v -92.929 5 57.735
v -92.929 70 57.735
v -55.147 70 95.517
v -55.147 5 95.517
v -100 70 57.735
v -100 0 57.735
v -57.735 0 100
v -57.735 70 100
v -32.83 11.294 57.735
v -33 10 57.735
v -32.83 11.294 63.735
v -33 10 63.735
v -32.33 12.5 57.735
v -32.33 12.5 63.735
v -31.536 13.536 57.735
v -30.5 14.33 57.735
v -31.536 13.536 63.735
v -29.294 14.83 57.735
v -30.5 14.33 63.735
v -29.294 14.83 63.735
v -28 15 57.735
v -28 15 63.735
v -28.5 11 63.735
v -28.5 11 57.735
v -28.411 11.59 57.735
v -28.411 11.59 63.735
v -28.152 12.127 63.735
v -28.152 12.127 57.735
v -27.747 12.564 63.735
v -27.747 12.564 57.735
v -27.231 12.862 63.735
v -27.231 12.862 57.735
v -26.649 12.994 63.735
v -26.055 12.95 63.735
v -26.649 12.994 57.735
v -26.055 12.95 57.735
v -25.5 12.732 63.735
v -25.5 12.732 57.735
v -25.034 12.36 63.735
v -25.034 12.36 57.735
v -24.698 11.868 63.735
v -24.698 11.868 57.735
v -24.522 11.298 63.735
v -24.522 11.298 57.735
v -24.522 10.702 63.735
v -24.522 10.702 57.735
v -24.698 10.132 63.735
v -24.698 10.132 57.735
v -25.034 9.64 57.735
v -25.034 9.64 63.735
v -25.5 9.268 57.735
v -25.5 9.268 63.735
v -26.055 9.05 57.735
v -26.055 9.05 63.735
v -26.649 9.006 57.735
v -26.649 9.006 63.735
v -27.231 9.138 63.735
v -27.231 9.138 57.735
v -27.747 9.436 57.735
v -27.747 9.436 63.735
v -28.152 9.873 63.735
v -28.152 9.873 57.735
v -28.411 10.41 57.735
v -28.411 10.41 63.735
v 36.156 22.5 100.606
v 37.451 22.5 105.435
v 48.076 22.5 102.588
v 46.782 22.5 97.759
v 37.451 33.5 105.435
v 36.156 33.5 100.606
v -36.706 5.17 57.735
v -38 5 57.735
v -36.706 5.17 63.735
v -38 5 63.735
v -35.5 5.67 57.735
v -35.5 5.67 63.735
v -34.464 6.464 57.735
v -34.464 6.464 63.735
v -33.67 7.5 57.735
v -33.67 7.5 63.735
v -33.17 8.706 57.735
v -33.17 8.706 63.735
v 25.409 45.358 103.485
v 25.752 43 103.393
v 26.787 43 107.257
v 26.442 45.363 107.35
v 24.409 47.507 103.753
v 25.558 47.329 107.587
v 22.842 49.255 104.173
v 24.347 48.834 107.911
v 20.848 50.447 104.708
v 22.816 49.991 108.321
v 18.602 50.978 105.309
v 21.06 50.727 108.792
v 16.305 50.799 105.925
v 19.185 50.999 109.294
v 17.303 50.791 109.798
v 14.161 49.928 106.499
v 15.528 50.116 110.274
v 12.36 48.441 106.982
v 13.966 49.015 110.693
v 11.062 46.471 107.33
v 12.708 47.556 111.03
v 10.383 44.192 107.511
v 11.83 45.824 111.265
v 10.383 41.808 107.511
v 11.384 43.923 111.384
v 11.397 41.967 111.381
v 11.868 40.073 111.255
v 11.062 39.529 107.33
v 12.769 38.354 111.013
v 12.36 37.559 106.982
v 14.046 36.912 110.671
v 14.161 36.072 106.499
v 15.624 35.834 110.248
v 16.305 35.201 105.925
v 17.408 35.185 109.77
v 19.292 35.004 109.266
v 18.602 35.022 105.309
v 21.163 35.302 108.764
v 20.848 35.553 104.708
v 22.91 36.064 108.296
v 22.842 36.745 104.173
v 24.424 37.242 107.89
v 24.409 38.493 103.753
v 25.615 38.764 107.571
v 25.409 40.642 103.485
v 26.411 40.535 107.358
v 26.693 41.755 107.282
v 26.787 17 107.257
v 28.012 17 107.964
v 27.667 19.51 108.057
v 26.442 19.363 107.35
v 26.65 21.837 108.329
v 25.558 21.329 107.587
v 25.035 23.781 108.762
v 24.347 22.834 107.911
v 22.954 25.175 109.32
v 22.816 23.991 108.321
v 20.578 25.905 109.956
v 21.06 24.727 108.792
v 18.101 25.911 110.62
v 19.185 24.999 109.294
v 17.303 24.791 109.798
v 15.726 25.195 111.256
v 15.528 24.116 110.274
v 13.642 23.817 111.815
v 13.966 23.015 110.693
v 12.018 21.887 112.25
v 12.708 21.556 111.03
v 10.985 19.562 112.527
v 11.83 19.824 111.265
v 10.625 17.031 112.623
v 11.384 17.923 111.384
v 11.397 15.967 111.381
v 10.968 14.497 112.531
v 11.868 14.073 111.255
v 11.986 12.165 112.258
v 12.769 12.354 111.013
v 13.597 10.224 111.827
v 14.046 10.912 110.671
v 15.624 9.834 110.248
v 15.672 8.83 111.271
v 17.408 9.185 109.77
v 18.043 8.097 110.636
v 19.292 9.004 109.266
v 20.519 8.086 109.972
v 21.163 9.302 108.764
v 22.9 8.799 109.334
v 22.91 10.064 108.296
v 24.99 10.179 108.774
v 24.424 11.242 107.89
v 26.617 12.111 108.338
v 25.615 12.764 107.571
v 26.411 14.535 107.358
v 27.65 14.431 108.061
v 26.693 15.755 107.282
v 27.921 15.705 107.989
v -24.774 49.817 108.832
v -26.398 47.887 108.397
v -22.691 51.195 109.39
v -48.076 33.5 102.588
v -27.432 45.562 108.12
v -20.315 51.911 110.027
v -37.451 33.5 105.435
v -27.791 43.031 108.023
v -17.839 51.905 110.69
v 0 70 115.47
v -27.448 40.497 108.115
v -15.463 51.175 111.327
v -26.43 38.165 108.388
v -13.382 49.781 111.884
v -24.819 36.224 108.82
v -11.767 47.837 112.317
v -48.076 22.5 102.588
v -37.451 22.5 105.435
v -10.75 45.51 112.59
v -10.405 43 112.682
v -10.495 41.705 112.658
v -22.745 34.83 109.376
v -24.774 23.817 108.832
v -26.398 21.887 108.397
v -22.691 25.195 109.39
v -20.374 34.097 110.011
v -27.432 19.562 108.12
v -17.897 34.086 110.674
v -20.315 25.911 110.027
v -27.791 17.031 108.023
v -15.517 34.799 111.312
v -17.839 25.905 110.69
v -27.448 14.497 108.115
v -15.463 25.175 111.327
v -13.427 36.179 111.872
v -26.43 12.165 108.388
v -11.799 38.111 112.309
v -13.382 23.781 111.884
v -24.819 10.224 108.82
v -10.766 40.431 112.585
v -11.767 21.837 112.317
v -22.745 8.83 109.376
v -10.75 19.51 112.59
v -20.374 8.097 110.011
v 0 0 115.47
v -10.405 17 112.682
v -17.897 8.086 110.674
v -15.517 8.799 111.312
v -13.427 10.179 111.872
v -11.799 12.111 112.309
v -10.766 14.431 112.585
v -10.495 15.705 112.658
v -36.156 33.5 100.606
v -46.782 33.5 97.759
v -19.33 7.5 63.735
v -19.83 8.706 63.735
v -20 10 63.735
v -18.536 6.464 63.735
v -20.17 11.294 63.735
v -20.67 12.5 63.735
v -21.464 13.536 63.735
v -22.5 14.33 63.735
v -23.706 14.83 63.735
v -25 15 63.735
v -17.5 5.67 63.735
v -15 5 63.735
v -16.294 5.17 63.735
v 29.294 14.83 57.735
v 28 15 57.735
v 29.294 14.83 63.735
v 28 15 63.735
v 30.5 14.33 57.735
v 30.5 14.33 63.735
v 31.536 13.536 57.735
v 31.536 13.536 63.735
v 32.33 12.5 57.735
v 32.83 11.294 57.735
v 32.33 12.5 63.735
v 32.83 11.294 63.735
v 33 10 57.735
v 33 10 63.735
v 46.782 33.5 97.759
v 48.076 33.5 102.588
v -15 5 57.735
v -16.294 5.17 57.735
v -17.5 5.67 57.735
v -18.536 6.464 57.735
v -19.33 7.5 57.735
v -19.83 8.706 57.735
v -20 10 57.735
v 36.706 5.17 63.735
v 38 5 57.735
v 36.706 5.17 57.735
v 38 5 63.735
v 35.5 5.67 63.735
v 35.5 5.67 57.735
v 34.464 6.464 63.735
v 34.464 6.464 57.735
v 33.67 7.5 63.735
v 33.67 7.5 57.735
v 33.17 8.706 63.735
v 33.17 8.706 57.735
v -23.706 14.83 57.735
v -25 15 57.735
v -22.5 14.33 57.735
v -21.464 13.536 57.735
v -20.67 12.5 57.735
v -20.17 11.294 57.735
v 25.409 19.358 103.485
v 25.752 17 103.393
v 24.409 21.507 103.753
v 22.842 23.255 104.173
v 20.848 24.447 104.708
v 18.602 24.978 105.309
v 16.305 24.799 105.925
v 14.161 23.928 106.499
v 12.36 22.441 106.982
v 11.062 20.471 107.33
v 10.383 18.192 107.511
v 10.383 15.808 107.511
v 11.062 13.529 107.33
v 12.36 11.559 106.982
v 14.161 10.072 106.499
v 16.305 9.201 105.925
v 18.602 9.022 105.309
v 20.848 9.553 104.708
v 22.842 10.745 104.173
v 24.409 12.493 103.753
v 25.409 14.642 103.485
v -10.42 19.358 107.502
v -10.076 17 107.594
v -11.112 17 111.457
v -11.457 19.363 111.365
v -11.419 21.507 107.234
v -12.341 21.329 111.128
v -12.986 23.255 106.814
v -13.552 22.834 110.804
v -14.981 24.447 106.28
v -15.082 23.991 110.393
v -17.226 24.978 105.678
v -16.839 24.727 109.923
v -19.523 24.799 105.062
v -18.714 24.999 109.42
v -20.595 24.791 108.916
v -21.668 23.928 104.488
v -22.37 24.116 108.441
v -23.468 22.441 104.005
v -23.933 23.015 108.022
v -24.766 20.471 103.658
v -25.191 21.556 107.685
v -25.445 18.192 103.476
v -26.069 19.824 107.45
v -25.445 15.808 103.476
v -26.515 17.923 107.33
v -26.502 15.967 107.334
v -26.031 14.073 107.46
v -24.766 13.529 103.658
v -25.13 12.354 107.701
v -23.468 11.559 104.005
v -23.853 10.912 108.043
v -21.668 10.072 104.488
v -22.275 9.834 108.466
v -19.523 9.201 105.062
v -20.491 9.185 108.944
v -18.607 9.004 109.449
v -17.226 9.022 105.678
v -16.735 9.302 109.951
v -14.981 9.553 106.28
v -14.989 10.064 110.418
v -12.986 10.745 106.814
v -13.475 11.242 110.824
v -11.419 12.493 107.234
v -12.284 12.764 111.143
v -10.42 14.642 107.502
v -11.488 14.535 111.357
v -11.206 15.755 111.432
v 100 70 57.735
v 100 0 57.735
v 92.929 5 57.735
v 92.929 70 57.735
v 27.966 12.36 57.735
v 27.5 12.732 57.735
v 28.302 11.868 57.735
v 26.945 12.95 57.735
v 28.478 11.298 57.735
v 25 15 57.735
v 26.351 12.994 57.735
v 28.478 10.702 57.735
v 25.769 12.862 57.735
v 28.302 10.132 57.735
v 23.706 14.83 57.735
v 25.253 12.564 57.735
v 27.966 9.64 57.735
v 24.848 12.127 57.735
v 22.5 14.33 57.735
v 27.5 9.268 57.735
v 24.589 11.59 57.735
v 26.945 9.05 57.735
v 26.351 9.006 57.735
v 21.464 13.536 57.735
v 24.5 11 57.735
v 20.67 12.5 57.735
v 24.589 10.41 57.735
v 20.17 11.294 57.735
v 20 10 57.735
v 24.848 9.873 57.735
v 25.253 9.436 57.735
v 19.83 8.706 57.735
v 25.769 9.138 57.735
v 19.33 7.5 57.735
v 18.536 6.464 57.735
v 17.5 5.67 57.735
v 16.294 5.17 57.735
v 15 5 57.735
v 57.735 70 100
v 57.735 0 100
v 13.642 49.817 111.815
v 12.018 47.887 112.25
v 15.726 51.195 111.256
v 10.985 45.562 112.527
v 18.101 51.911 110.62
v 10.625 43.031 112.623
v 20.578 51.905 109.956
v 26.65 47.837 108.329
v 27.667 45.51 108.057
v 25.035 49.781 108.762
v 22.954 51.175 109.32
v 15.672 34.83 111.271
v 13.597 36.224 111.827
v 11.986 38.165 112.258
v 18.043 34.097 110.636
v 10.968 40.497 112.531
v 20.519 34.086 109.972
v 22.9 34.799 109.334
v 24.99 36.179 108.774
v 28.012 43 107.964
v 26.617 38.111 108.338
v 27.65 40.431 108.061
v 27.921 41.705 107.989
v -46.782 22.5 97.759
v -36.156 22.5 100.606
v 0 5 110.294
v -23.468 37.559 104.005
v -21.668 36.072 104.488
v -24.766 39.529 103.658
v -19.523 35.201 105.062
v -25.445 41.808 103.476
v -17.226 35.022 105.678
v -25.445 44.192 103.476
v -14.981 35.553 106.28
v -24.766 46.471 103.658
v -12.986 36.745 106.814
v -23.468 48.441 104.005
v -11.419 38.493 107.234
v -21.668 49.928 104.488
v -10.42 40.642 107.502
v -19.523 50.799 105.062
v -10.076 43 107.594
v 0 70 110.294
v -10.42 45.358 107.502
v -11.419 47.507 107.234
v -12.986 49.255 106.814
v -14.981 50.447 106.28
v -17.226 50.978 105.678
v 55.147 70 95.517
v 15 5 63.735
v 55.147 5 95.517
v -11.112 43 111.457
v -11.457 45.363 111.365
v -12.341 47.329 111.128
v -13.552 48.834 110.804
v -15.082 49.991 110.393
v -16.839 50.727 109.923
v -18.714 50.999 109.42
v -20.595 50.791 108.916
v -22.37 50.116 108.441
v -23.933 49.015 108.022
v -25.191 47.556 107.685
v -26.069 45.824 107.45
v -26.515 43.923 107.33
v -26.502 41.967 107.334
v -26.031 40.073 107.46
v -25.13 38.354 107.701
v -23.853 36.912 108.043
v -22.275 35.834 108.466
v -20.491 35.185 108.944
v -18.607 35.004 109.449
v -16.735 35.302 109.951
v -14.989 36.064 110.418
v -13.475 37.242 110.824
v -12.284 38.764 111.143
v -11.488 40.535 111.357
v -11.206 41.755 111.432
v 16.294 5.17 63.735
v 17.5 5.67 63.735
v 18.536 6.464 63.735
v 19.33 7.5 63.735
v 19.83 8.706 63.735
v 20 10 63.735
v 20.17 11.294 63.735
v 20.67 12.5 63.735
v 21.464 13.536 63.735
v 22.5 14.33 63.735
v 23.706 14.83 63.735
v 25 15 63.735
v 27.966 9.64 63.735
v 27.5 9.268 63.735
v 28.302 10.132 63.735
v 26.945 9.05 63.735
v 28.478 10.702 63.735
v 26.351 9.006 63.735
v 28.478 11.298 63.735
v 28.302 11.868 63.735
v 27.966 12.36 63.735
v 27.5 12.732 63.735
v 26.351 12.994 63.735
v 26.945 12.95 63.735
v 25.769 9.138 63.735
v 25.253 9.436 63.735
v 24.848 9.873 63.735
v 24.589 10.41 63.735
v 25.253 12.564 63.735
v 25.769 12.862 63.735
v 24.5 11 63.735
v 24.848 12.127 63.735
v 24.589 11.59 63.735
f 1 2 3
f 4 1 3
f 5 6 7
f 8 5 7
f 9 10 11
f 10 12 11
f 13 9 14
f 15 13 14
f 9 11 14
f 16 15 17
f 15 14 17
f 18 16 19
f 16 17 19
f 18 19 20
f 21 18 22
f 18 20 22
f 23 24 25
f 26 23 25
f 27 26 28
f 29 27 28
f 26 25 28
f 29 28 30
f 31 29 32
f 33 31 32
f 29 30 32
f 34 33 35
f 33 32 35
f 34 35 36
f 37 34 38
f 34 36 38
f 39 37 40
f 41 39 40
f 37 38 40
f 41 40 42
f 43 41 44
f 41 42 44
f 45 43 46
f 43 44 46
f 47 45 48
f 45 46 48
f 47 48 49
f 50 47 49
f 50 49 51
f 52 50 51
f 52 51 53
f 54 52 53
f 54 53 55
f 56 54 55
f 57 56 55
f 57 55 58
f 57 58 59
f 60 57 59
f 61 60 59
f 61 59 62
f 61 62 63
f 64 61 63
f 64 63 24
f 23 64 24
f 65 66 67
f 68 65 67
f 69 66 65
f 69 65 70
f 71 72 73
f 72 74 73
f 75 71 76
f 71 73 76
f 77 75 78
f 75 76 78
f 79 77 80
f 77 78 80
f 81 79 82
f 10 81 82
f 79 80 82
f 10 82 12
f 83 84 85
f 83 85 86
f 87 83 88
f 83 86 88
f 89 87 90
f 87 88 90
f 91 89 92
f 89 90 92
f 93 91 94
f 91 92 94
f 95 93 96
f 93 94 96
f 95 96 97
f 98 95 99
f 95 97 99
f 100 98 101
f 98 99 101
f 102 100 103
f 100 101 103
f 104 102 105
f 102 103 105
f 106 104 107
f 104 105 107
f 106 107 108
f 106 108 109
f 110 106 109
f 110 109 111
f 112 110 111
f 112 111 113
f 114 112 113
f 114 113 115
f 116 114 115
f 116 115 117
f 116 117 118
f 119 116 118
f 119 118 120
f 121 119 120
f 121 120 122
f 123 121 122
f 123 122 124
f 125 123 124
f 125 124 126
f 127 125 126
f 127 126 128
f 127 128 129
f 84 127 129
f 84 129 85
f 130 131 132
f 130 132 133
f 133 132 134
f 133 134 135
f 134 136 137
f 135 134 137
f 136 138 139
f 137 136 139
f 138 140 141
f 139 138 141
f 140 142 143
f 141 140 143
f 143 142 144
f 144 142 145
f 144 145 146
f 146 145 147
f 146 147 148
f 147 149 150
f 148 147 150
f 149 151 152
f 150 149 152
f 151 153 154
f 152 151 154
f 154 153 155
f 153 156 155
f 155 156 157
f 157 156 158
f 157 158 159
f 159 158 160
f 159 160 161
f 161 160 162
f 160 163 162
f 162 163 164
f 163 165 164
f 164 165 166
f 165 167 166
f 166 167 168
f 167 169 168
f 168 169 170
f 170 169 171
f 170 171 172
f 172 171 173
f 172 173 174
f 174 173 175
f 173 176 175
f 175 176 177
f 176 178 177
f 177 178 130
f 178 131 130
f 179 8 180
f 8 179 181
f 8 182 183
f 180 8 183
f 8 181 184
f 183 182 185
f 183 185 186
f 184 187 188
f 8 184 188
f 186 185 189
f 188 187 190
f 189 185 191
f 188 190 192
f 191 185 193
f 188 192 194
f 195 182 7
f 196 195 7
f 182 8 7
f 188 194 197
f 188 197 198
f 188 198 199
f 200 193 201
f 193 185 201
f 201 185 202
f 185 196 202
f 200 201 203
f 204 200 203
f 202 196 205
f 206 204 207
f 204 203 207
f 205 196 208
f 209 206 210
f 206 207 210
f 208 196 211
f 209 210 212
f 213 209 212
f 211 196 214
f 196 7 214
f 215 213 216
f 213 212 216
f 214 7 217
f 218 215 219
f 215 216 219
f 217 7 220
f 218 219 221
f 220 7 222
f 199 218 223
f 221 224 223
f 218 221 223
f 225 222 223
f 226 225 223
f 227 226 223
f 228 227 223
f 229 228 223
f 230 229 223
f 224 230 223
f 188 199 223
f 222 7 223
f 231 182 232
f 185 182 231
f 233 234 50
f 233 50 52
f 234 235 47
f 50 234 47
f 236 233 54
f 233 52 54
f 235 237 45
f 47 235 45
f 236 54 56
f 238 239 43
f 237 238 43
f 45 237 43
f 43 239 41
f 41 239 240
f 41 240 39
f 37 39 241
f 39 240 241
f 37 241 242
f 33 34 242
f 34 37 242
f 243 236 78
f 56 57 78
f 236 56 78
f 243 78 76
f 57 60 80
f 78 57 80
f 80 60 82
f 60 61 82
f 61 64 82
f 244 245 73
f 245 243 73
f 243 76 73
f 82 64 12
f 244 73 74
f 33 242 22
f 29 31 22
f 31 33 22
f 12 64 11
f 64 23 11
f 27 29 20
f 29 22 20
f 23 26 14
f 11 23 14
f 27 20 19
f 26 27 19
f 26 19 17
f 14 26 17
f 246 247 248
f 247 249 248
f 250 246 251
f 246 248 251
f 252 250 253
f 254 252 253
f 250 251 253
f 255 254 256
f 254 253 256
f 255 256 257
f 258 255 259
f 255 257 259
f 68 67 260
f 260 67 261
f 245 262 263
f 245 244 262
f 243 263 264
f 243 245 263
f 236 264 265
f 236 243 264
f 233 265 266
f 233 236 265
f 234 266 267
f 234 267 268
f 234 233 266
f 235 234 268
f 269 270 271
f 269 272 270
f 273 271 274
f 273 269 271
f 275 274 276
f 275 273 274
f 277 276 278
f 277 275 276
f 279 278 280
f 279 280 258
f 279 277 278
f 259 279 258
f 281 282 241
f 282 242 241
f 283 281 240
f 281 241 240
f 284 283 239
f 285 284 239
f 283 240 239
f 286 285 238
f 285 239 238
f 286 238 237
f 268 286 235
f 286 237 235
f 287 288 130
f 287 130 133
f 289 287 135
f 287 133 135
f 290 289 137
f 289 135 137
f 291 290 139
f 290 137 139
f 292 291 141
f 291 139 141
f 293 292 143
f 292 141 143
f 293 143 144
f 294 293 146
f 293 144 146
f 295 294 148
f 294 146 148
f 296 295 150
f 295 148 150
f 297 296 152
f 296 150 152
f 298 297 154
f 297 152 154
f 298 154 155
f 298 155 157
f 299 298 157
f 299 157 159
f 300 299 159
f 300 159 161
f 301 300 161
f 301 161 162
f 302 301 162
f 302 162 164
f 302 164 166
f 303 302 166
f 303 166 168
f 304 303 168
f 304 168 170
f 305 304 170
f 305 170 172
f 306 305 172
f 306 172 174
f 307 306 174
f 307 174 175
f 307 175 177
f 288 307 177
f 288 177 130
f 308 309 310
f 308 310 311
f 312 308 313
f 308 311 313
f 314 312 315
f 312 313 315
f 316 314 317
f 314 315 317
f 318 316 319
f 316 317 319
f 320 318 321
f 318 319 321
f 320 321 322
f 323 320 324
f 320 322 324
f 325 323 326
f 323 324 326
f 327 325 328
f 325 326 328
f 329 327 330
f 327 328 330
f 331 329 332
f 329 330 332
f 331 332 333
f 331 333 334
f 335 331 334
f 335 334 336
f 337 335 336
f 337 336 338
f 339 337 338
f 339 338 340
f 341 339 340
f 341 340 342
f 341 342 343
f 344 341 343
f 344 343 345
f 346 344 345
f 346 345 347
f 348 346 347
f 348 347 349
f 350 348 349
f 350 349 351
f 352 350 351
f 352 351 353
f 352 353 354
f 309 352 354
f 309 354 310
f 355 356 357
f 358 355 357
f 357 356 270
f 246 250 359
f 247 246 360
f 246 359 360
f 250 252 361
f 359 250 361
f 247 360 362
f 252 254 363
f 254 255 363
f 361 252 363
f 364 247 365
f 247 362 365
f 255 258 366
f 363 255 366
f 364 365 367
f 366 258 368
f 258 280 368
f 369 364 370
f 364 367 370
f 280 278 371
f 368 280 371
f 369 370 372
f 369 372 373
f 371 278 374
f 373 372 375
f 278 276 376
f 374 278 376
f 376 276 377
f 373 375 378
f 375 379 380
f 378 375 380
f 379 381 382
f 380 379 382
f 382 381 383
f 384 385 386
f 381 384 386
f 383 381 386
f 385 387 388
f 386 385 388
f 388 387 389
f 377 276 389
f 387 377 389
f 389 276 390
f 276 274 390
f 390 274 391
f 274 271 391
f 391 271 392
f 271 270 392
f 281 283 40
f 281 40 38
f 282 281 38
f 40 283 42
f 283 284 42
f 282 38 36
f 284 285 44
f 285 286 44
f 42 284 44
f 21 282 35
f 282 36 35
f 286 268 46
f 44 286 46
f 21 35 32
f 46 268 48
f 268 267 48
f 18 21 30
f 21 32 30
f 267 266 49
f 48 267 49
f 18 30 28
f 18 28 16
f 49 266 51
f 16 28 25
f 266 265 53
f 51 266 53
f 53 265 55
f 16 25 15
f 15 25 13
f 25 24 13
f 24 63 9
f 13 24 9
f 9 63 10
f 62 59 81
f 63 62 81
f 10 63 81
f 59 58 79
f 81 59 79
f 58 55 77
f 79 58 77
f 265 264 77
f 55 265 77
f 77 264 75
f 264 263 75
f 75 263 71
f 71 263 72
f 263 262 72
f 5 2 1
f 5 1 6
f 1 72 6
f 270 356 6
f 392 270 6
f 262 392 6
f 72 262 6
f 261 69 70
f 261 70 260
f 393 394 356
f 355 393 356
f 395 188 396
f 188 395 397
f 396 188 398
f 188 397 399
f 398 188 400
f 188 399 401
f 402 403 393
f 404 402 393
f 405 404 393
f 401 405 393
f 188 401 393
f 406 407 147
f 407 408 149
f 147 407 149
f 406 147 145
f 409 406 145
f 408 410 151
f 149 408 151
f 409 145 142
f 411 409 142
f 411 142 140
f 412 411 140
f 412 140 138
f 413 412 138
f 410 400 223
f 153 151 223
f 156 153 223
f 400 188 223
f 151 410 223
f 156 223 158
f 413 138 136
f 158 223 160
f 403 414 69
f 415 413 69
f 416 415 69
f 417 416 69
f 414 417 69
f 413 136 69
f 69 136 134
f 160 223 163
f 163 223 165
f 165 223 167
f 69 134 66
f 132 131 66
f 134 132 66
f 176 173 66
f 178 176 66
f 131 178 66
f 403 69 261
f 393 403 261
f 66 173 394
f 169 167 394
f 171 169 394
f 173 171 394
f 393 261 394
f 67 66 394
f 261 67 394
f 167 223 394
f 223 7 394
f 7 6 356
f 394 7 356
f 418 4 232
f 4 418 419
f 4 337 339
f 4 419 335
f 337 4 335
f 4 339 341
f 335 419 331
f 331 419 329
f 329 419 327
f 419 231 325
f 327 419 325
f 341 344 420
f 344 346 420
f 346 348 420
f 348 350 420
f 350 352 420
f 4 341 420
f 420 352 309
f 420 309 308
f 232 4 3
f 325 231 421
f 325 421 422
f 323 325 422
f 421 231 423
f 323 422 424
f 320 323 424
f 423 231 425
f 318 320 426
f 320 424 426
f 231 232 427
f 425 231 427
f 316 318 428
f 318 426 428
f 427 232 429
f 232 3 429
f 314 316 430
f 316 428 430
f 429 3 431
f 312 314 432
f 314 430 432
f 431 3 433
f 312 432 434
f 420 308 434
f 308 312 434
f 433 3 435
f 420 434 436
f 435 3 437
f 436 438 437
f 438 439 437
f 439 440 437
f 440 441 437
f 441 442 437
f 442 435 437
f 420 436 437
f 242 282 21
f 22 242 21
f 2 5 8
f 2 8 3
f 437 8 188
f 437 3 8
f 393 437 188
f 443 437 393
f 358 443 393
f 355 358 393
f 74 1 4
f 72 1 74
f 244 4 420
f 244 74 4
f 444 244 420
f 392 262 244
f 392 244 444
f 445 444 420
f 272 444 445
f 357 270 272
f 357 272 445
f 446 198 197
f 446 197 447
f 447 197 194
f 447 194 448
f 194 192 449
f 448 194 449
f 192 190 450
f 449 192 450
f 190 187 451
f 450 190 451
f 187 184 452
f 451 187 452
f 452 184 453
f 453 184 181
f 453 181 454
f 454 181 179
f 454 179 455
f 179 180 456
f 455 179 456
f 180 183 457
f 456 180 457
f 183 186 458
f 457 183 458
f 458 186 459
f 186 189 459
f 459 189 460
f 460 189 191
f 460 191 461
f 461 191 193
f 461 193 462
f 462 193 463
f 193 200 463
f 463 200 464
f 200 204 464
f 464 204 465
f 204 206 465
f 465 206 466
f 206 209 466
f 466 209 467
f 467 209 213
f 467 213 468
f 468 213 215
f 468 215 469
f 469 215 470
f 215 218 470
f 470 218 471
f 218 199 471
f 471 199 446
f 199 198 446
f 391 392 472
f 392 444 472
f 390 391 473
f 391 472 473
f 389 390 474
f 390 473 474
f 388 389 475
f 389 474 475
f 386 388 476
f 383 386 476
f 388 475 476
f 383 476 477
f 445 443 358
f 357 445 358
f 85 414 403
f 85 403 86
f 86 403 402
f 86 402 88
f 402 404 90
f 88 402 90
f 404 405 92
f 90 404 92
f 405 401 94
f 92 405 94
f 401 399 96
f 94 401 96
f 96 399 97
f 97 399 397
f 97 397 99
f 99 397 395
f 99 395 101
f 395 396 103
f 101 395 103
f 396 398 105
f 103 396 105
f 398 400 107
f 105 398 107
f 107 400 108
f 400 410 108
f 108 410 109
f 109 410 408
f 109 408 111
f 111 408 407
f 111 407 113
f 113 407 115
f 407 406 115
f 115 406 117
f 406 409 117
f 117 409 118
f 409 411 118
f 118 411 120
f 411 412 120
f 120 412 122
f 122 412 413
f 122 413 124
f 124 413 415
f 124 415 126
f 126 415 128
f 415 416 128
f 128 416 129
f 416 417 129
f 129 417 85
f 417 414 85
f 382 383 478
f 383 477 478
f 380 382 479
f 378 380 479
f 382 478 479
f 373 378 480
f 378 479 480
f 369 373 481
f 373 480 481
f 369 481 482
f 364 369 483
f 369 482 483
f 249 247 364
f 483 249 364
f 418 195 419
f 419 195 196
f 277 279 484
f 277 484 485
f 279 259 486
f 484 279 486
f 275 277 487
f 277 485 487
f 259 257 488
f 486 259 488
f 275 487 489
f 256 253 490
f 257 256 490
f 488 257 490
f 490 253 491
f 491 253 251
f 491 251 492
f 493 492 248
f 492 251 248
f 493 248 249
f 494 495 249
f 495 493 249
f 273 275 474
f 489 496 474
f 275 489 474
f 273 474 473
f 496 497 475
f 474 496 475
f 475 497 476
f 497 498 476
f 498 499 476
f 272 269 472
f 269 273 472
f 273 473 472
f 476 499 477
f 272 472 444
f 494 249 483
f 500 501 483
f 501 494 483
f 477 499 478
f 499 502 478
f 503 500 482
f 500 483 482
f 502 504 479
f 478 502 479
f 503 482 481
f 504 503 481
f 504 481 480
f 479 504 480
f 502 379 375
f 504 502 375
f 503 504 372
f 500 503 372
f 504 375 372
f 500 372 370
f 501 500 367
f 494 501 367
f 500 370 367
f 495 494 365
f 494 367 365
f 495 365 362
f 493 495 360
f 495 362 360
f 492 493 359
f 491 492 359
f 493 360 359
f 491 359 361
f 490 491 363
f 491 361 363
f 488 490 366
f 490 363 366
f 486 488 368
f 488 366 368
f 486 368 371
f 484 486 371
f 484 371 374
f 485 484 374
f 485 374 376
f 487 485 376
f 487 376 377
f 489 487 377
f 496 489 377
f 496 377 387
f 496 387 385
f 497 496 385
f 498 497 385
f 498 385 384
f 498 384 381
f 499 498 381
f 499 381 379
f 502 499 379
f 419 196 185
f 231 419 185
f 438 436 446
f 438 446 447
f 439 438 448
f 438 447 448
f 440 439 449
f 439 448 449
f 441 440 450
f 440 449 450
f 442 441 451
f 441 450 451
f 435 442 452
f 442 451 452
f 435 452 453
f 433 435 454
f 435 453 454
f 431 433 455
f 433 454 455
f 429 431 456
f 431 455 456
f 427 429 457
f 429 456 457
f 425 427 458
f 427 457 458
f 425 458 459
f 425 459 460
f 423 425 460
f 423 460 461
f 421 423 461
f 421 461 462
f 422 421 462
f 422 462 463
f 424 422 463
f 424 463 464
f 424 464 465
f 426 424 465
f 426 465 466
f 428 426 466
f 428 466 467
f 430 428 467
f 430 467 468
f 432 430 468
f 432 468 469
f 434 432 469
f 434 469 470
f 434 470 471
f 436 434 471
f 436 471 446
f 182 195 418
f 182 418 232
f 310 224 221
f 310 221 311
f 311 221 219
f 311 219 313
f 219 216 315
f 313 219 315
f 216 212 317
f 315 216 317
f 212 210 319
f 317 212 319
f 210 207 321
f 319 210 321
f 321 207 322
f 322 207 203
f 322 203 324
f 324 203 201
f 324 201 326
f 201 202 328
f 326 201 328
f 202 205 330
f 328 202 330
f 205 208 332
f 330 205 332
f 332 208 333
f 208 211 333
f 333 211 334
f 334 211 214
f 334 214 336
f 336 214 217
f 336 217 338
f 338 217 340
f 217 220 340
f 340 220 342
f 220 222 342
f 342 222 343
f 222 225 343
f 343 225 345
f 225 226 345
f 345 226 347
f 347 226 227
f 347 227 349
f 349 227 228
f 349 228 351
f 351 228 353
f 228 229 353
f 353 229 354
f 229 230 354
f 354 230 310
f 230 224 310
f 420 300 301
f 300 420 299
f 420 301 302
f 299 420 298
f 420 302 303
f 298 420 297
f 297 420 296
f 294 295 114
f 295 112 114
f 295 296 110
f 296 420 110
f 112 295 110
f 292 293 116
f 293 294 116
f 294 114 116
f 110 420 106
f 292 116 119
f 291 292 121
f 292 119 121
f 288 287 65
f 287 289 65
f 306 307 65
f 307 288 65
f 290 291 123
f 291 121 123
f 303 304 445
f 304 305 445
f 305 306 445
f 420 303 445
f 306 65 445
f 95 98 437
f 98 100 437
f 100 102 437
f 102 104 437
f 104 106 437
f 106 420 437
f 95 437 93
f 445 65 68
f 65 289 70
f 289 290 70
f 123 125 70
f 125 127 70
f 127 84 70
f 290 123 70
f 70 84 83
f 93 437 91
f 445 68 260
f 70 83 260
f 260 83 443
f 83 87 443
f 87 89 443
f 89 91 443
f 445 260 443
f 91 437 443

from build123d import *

# Parameters (mm, degrees)
BOSS_EXTRUDE1_DEPTH = 70
CUT_EXTRUDE1_DEPTH  = 65
SKETCH5_R           = 8
CUT_EXTRUDE2_DEPTH  = 10
SKETCH6_R           = 8
CUT_EXTRUDE3_DEPTH  = 10
CHAMFER2_SIZE       = 1
SKETCH7_W           = 11
SKETCH7_H           = 11
CUT_EXTRUDE4_DEPTH  = 10
SKETCH8_W           = 11
SKETCH8_H           = 11
CUT_EXTRUDE5_DEPTH  = 10
SKETCH9_W           = 13
SKETCH9_H           = 10
BOSS_EXTRUDE2_DEPTH = 6
SKETCH10_R          = 2
CUT_EXTRUDE6_DEPTH  = 10
FILLET1_R           = 5


with BuildPart() as part:
    # Sketch1 → Boss-Extrude1 (new body)
    with BuildSketch(Plane(origin=(0, 0, 0), x_dir=(1, 0, 0), z_dir=(0, 1, 0))):
        Polygon((57.735026919, -100), (100, -57.735026919), (-100, -57.735026919), (-57.735026919, -100), (0, -115.470053838), align=None)
    extrude(amount=BOSS_EXTRUDE1_DEPTH)

    # Sketch4 → Cut-Extrude1 (cut)
    with BuildSketch(Plane(origin=(0, 70, 0), x_dir=(1, 0, 0), z_dir=(0, 1, 0))):
        Polygon((110.293672936, 0), (95.517122639, 55.146836468), (55.146836468, 95.517122639), (0, 110.293672936), (-55.146836468, 95.517122639), (-95.517122639, 55.146836468), (-110.293672936, 0), (-95.517122639, -55.146836468), (-55.146836468, -95.517122639), (0, -110.293672936), (55.146836468, -95.517122639), (95.517122639, -55.146836468), align=None)
    extrude(amount=-CUT_EXTRUDE1_DEPTH, mode=Mode.SUBTRACT)

    # Sketch5 → Cut-Extrude2 (cut)
    with BuildSketch(Plane(origin=(-28.867513459, 0, 107.735026919), x_dir=(0.9659258262890683, 0, 0.25881904510252085), z_dir=(-0.2588190451025208, 0, 0.9659258262890682))):
        with Locations((10.114150928, 43)):
            Circle(SKETCH5_R)
        with Locations((10.114150928, 17)):
            Circle(SKETCH5_R)
    extrude(amount=-CUT_EXTRUDE2_DEPTH, mode=Mode.SUBTRACT)

    # Sketch6 → Cut-Extrude3 (cut)
    with BuildSketch(Plane(origin=(28.867513459, 0, 107.735026919), x_dir=(0.9659258262890683, 0, -0.25881904510252085), z_dir=(0.2588190451025208, 0, 0.9659258262890682))):
        with Locations((-9.885849072, 17)):
            Circle(SKETCH6_R)
        with Locations((-9.885849072, 43)):
            Circle(SKETCH6_R)
    extrude(amount=-CUT_EXTRUDE3_DEPTH, mode=Mode.SUBTRACT)

    # Chamfer2
    chamfer2_edges = [part.edges().sort_by_distance(p)[0] for p in [
        (-26.825400478, 43, 108.282209443),
        (-26.825400478, 17, 108.282209443),
        (11.591109915, 17, 112.364225297),
        (11.591109915, 43, 112.364225297),
    ]]
    chamfer(chamfer2_edges, length=CHAMFER2_SIZE)

    # Sketch7 → Cut-Extrude4 (cut)
    with BuildSketch(Plane(origin=(-28.867513459, 0, 107.735026919), x_dir=(0.9659258262890683, 0, 0.25881904510252085), z_dir=(-0.2588190451025208, 0, 0.9659258262890682))):
        with Locations((-14.385849072, 28)):
            Rectangle(SKETCH7_W, SKETCH7_H)
    extrude(amount=-CUT_EXTRUDE4_DEPTH, mode=Mode.SUBTRACT)

    # Sketch8 → Cut-Extrude5 (cut)
    with BuildSketch(Plane(origin=(28.867513459, 0, 107.735026919), x_dir=(0.9659258262890683, 0, -0.25881904510252085), z_dir=(0.2588190451025208, 0, 0.9659258262890682))):
        with Locations((14.385849072, 28)):
            Rectangle(SKETCH8_W, SKETCH8_H)
    extrude(amount=-CUT_EXTRUDE5_DEPTH, mode=Mode.SUBTRACT)

    # Sketch9 → Boss-Extrude2 (add)
    with BuildSketch(Plane(origin=(0, 0, 57.735026919), x_dir=(-1, 0, 0), z_dir=(0, 0, -1))):
        with Locations((-26.5, 10)):
            Rectangle(SKETCH9_W, SKETCH9_H)
        with Locations((26.5, 10)):
            Rectangle(SKETCH9_W, SKETCH9_H)
    extrude(amount=-BOSS_EXTRUDE2_DEPTH)

    # Sketch10 → Cut-Extrude6 (cut)
    with BuildSketch(Plane(origin=(0, 0, 57.735026919), x_dir=(-1, 0, 0), z_dir=(0, 0, -1))):
        with Locations((-26.5, 11)):
            Circle(SKETCH10_R)
        with Locations((26.5, 11)):
            Circle(SKETCH10_R)
    extrude(amount=-CUT_EXTRUDE6_DEPTH, mode=Mode.SUBTRACT)

    # Fillet1
    fillet1_edges = [part.edges().sort_by_distance(p)[0] for p in [
        (-33, 5, 60.735026919),
        (-20, 5, 60.735026919),
        (20, 5, 60.735026919),
        (33, 5, 60.735026919),
    ]]
    fillet(fillet1_edges, radius=FILLET1_R)
    fillet1_2_edges = [part.edges().sort_by_distance(p)[0] for p in [
        (-33, 15, 60.735026919),
        (-20, 15, 60.735026919),
        (20, 15, 60.735026919),
        (33, 15, 60.735026919),
    ]]
    fillet(fillet1_2_edges, radius=FILLET1_R - 0.0001)  # a hair under: the kernel refuses the full size


solid = part.part
